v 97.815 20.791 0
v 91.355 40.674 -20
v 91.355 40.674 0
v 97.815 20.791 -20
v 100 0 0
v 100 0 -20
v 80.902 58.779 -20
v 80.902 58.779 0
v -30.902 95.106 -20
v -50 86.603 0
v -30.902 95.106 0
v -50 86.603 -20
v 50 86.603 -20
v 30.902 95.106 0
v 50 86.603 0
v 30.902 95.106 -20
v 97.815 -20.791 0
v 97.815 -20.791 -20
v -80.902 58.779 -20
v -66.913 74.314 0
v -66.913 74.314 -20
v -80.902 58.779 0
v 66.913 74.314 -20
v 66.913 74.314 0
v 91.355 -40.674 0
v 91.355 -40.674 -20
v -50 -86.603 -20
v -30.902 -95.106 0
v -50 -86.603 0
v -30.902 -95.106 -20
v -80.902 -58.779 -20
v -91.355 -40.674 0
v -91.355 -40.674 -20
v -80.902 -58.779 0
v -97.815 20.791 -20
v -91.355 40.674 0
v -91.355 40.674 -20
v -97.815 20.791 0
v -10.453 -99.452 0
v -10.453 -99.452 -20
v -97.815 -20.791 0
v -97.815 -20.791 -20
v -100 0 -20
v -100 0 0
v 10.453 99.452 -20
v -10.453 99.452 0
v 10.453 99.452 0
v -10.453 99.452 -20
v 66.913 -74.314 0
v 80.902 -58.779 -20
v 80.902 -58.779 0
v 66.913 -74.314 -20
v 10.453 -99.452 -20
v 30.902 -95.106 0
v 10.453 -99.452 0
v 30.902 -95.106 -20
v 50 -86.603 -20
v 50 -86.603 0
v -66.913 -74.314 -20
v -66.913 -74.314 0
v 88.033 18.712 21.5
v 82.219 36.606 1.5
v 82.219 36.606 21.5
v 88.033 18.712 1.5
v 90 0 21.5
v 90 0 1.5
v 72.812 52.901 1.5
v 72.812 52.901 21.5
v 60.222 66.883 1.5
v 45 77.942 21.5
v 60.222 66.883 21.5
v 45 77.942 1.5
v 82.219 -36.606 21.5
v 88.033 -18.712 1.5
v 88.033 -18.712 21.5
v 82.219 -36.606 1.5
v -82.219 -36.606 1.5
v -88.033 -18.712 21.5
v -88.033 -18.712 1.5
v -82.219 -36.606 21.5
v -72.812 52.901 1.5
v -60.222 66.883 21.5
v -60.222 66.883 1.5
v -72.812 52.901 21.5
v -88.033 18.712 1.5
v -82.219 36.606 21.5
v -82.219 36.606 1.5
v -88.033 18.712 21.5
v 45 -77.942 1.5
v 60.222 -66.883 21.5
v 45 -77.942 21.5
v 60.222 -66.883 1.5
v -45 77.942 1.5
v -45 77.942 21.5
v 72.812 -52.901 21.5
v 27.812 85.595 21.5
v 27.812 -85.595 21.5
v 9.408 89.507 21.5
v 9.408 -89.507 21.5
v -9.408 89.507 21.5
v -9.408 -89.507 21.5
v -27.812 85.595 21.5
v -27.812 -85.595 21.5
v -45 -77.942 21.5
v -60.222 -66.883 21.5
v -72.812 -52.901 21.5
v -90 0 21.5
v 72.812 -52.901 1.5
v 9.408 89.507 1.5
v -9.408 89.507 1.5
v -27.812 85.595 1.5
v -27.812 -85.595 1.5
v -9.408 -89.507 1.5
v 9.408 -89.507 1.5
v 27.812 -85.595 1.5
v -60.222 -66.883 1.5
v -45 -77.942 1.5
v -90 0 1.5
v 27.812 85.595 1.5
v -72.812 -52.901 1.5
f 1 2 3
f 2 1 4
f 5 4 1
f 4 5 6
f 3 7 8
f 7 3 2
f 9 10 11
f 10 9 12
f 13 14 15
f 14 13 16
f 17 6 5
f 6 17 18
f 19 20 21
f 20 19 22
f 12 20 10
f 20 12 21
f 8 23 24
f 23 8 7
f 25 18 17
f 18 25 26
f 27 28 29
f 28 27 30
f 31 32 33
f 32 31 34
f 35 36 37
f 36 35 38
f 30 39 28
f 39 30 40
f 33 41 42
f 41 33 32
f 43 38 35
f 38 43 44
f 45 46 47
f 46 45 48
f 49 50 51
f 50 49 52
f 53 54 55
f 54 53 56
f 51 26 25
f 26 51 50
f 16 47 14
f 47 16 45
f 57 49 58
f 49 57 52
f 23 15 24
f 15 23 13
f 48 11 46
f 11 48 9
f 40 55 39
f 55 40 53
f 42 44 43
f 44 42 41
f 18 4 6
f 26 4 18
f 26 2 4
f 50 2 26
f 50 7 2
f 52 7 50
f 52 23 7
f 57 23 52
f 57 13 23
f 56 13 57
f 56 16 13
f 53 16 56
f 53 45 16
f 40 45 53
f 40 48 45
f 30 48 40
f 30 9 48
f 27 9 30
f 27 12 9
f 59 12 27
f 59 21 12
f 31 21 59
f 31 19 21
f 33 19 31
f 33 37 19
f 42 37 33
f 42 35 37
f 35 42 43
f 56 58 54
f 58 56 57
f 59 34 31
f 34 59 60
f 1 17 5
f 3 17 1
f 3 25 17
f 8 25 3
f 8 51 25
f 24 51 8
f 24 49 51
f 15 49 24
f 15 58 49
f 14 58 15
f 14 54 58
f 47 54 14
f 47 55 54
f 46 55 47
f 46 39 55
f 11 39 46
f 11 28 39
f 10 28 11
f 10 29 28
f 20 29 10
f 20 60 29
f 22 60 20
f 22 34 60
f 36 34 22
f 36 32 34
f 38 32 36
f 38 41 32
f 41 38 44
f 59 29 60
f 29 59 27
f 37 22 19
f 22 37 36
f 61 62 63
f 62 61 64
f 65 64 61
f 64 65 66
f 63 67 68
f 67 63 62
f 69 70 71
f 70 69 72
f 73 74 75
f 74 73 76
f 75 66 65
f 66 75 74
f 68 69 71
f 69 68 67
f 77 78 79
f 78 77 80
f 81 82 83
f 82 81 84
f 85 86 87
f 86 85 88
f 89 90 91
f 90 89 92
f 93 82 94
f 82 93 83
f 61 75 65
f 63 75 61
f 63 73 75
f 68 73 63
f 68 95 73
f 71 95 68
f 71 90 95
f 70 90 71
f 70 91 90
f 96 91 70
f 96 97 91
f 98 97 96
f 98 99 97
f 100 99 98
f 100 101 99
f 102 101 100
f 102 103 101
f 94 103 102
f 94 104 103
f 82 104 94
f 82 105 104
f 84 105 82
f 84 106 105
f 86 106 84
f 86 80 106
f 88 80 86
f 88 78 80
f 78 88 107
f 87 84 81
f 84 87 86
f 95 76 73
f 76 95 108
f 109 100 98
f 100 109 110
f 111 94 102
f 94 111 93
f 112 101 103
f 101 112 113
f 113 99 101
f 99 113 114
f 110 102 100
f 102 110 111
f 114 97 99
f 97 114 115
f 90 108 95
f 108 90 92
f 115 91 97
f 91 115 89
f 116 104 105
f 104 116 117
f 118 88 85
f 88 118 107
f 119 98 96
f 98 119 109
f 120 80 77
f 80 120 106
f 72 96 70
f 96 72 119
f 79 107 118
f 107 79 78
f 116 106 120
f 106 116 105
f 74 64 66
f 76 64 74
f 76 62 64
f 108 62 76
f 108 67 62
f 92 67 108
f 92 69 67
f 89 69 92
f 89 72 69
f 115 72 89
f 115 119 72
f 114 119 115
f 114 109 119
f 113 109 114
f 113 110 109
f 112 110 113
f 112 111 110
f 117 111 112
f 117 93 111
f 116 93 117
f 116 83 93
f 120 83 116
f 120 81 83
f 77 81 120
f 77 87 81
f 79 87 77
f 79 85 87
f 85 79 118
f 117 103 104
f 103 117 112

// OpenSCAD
// Motor Parameters
d_motor = 200.0;
t_motor = 40;
stator_radius = 90.0;
magnet_width = 39.269908169872416;
coil_width = 35.34291735288517;
air_gap = 1.5;

// Generate Rotor
module rotor() {
    cylinder(h = t_motor/2, r = d_motor/2, center = true);
}

// Generate Stator
module stator() {
    cylinder(h = t_motor/2, r = stator_radius, center = true);
}

// Generate Magnets
module magnet() {
    cube([magnet_width, 5, 3], center=true);
}

// Generate Coils
module coil() {
    cube([coil_width, 6, 4], center=true);
}

// Assembling the Motor
translate([0, 0, -t_motor/4]) rotor();
translate([0, 0, t_motor/4 + air_gap]) stator();
    
